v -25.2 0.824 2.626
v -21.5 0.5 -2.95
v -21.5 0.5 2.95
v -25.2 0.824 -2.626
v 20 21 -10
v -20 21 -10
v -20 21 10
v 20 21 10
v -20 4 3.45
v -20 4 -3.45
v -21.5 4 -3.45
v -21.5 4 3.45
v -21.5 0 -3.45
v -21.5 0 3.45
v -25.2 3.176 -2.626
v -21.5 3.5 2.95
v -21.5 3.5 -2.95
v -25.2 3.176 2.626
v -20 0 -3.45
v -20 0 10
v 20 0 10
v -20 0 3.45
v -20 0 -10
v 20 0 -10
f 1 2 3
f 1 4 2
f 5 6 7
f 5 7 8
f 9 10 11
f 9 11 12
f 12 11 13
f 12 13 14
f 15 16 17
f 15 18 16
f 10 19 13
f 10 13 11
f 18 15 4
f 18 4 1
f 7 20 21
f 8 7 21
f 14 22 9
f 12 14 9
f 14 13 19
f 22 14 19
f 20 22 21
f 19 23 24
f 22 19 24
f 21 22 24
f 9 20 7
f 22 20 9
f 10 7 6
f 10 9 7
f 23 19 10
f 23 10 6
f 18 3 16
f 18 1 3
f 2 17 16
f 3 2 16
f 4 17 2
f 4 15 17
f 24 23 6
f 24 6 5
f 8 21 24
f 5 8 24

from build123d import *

# Parameters (mm, degrees)
CROQUIS_BASE_W          = 40
CROQUIS_BASE_H          = 20
SALIENTE_EXTRUIR1_DEPTH = 21
CROQUIS_SOCKET_W        = 6.9
CROQUIS_SOCKET_H        = 4
SALIENTE_EXTRUIR2_DEPTH = 1.5
CROQUIS_SOCKET_2_W      = 5.9
CROQUIS_SOCKET_2_H      = 3
SALIENTE_EXTRUIR4_DEPTH = 3.7
SALIENTE_EXTRUIR4_TAPER = 5


with BuildPart() as part:
    # Croquis base → Saliente-Extruir1 (new body)
    with BuildSketch(Plane(origin=(0, 0, 0), x_dir=(1, 0, 0), z_dir=(0, 1, 0))):
        Rectangle(CROQUIS_BASE_W, CROQUIS_BASE_H)
    extrude(amount=SALIENTE_EXTRUIR1_DEPTH)

    # Croquis socket → Saliente-Extruir2 (add)
    with BuildSketch(Plane.ZY.offset(20)):
        with Locations((0, 2)):
            Rectangle(CROQUIS_SOCKET_W, CROQUIS_SOCKET_H)
    extrude(amount=SALIENTE_EXTRUIR2_DEPTH)


with BuildPart() as body_2:
    # Croquis socket 2 → Saliente-Extruir4 (new body)
    with BuildSketch(Plane.ZY.offset(21.5)):
        with Locations((0, 2)):
            Rectangle(CROQUIS_SOCKET_2_W, CROQUIS_SOCKET_2_H)
    extrude(amount=SALIENTE_EXTRUIR4_DEPTH, taper=SALIENTE_EXTRUIR4_TAPER)


solid = Compound([part.part, body_2.part])
